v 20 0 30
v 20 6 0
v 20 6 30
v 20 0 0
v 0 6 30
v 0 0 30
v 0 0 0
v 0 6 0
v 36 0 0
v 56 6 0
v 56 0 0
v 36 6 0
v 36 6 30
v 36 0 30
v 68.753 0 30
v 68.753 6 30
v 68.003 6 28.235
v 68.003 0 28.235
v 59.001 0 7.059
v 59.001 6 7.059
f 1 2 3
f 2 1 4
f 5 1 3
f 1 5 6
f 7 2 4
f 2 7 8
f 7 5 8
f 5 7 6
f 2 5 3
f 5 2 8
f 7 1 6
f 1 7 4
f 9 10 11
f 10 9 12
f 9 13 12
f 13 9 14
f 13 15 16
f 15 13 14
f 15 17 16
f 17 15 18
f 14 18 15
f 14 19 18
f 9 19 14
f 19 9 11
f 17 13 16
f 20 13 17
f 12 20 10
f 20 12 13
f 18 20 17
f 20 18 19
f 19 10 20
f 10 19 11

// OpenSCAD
// Draft: a wall with a slight outward taper from base to top, contrasted
// against a draftless (vertical) wall. Angle exaggerated for visibility.
$fn = 0;
base_w = 20; depth = 6; h = 30; draft_deg = 12;
top_w = base_w + 2 * h * tan(draft_deg);

// draftless (vertical) wall, for contrast
cube([base_w, depth, h]);

// drafted wall, tapering outward with height
translate([base_w + 16, 0, 0])
linear_extrude(height = h, scale = [top_w / base_w, 1])
square([base_w, depth]);
